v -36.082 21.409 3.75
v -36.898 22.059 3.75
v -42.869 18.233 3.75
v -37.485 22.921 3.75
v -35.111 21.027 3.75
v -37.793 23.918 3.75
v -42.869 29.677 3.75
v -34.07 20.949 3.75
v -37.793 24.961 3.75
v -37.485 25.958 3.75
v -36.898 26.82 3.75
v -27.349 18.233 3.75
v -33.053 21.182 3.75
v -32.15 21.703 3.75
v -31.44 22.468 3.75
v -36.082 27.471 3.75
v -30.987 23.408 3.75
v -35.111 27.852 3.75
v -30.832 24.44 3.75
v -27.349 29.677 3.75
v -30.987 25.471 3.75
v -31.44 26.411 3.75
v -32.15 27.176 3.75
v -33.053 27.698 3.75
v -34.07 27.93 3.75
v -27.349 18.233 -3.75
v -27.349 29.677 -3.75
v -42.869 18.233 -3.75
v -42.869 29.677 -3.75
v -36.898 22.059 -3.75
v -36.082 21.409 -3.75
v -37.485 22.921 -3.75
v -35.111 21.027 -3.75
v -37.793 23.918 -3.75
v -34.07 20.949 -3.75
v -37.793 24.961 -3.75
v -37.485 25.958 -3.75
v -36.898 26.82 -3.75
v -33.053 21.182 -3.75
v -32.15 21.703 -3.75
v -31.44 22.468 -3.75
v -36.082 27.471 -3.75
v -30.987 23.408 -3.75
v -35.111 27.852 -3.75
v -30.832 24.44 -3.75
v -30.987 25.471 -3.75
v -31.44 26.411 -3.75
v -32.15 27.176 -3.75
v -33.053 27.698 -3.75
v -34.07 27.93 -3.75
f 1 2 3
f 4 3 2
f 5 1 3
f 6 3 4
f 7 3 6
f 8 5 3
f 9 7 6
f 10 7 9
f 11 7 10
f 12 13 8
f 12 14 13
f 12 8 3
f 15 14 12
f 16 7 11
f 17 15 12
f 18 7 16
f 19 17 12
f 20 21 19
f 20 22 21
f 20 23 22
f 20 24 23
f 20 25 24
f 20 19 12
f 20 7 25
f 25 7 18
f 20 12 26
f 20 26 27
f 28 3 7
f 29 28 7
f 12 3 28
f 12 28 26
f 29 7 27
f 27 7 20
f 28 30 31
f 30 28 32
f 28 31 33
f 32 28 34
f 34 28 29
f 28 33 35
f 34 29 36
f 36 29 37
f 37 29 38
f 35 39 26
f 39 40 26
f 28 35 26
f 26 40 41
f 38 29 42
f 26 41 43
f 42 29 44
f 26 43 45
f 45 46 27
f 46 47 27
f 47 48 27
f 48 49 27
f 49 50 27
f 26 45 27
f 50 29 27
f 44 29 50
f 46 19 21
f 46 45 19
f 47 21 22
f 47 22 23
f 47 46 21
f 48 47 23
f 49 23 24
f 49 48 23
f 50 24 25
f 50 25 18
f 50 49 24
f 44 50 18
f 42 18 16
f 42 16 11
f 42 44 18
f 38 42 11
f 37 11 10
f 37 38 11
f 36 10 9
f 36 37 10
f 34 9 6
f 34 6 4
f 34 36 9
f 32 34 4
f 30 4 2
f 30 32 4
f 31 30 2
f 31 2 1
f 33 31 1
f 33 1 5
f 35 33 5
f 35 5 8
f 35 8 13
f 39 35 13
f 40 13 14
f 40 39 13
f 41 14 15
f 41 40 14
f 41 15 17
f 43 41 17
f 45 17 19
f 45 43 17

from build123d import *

# Parameters (mm, degrees)
F0_W     = 15.52
F0_H     = 11.443967
F0_R     = 3.5
F1_DEPTH = 3.75


with BuildPart() as f1:
    # F0 (on Top) → F1 (new body, symmetric)
    with BuildSketch(Plane.XY):
        with Locations((-35.109139, 23.954742)):
            Rectangle(F0_W, F0_H)
        with Locations((-34.331899, 24.439655)):
            Circle(F0_R, mode=Mode.SUBTRACT)
    extrude(amount=F1_DEPTH, both=True)


solid = f1.part
